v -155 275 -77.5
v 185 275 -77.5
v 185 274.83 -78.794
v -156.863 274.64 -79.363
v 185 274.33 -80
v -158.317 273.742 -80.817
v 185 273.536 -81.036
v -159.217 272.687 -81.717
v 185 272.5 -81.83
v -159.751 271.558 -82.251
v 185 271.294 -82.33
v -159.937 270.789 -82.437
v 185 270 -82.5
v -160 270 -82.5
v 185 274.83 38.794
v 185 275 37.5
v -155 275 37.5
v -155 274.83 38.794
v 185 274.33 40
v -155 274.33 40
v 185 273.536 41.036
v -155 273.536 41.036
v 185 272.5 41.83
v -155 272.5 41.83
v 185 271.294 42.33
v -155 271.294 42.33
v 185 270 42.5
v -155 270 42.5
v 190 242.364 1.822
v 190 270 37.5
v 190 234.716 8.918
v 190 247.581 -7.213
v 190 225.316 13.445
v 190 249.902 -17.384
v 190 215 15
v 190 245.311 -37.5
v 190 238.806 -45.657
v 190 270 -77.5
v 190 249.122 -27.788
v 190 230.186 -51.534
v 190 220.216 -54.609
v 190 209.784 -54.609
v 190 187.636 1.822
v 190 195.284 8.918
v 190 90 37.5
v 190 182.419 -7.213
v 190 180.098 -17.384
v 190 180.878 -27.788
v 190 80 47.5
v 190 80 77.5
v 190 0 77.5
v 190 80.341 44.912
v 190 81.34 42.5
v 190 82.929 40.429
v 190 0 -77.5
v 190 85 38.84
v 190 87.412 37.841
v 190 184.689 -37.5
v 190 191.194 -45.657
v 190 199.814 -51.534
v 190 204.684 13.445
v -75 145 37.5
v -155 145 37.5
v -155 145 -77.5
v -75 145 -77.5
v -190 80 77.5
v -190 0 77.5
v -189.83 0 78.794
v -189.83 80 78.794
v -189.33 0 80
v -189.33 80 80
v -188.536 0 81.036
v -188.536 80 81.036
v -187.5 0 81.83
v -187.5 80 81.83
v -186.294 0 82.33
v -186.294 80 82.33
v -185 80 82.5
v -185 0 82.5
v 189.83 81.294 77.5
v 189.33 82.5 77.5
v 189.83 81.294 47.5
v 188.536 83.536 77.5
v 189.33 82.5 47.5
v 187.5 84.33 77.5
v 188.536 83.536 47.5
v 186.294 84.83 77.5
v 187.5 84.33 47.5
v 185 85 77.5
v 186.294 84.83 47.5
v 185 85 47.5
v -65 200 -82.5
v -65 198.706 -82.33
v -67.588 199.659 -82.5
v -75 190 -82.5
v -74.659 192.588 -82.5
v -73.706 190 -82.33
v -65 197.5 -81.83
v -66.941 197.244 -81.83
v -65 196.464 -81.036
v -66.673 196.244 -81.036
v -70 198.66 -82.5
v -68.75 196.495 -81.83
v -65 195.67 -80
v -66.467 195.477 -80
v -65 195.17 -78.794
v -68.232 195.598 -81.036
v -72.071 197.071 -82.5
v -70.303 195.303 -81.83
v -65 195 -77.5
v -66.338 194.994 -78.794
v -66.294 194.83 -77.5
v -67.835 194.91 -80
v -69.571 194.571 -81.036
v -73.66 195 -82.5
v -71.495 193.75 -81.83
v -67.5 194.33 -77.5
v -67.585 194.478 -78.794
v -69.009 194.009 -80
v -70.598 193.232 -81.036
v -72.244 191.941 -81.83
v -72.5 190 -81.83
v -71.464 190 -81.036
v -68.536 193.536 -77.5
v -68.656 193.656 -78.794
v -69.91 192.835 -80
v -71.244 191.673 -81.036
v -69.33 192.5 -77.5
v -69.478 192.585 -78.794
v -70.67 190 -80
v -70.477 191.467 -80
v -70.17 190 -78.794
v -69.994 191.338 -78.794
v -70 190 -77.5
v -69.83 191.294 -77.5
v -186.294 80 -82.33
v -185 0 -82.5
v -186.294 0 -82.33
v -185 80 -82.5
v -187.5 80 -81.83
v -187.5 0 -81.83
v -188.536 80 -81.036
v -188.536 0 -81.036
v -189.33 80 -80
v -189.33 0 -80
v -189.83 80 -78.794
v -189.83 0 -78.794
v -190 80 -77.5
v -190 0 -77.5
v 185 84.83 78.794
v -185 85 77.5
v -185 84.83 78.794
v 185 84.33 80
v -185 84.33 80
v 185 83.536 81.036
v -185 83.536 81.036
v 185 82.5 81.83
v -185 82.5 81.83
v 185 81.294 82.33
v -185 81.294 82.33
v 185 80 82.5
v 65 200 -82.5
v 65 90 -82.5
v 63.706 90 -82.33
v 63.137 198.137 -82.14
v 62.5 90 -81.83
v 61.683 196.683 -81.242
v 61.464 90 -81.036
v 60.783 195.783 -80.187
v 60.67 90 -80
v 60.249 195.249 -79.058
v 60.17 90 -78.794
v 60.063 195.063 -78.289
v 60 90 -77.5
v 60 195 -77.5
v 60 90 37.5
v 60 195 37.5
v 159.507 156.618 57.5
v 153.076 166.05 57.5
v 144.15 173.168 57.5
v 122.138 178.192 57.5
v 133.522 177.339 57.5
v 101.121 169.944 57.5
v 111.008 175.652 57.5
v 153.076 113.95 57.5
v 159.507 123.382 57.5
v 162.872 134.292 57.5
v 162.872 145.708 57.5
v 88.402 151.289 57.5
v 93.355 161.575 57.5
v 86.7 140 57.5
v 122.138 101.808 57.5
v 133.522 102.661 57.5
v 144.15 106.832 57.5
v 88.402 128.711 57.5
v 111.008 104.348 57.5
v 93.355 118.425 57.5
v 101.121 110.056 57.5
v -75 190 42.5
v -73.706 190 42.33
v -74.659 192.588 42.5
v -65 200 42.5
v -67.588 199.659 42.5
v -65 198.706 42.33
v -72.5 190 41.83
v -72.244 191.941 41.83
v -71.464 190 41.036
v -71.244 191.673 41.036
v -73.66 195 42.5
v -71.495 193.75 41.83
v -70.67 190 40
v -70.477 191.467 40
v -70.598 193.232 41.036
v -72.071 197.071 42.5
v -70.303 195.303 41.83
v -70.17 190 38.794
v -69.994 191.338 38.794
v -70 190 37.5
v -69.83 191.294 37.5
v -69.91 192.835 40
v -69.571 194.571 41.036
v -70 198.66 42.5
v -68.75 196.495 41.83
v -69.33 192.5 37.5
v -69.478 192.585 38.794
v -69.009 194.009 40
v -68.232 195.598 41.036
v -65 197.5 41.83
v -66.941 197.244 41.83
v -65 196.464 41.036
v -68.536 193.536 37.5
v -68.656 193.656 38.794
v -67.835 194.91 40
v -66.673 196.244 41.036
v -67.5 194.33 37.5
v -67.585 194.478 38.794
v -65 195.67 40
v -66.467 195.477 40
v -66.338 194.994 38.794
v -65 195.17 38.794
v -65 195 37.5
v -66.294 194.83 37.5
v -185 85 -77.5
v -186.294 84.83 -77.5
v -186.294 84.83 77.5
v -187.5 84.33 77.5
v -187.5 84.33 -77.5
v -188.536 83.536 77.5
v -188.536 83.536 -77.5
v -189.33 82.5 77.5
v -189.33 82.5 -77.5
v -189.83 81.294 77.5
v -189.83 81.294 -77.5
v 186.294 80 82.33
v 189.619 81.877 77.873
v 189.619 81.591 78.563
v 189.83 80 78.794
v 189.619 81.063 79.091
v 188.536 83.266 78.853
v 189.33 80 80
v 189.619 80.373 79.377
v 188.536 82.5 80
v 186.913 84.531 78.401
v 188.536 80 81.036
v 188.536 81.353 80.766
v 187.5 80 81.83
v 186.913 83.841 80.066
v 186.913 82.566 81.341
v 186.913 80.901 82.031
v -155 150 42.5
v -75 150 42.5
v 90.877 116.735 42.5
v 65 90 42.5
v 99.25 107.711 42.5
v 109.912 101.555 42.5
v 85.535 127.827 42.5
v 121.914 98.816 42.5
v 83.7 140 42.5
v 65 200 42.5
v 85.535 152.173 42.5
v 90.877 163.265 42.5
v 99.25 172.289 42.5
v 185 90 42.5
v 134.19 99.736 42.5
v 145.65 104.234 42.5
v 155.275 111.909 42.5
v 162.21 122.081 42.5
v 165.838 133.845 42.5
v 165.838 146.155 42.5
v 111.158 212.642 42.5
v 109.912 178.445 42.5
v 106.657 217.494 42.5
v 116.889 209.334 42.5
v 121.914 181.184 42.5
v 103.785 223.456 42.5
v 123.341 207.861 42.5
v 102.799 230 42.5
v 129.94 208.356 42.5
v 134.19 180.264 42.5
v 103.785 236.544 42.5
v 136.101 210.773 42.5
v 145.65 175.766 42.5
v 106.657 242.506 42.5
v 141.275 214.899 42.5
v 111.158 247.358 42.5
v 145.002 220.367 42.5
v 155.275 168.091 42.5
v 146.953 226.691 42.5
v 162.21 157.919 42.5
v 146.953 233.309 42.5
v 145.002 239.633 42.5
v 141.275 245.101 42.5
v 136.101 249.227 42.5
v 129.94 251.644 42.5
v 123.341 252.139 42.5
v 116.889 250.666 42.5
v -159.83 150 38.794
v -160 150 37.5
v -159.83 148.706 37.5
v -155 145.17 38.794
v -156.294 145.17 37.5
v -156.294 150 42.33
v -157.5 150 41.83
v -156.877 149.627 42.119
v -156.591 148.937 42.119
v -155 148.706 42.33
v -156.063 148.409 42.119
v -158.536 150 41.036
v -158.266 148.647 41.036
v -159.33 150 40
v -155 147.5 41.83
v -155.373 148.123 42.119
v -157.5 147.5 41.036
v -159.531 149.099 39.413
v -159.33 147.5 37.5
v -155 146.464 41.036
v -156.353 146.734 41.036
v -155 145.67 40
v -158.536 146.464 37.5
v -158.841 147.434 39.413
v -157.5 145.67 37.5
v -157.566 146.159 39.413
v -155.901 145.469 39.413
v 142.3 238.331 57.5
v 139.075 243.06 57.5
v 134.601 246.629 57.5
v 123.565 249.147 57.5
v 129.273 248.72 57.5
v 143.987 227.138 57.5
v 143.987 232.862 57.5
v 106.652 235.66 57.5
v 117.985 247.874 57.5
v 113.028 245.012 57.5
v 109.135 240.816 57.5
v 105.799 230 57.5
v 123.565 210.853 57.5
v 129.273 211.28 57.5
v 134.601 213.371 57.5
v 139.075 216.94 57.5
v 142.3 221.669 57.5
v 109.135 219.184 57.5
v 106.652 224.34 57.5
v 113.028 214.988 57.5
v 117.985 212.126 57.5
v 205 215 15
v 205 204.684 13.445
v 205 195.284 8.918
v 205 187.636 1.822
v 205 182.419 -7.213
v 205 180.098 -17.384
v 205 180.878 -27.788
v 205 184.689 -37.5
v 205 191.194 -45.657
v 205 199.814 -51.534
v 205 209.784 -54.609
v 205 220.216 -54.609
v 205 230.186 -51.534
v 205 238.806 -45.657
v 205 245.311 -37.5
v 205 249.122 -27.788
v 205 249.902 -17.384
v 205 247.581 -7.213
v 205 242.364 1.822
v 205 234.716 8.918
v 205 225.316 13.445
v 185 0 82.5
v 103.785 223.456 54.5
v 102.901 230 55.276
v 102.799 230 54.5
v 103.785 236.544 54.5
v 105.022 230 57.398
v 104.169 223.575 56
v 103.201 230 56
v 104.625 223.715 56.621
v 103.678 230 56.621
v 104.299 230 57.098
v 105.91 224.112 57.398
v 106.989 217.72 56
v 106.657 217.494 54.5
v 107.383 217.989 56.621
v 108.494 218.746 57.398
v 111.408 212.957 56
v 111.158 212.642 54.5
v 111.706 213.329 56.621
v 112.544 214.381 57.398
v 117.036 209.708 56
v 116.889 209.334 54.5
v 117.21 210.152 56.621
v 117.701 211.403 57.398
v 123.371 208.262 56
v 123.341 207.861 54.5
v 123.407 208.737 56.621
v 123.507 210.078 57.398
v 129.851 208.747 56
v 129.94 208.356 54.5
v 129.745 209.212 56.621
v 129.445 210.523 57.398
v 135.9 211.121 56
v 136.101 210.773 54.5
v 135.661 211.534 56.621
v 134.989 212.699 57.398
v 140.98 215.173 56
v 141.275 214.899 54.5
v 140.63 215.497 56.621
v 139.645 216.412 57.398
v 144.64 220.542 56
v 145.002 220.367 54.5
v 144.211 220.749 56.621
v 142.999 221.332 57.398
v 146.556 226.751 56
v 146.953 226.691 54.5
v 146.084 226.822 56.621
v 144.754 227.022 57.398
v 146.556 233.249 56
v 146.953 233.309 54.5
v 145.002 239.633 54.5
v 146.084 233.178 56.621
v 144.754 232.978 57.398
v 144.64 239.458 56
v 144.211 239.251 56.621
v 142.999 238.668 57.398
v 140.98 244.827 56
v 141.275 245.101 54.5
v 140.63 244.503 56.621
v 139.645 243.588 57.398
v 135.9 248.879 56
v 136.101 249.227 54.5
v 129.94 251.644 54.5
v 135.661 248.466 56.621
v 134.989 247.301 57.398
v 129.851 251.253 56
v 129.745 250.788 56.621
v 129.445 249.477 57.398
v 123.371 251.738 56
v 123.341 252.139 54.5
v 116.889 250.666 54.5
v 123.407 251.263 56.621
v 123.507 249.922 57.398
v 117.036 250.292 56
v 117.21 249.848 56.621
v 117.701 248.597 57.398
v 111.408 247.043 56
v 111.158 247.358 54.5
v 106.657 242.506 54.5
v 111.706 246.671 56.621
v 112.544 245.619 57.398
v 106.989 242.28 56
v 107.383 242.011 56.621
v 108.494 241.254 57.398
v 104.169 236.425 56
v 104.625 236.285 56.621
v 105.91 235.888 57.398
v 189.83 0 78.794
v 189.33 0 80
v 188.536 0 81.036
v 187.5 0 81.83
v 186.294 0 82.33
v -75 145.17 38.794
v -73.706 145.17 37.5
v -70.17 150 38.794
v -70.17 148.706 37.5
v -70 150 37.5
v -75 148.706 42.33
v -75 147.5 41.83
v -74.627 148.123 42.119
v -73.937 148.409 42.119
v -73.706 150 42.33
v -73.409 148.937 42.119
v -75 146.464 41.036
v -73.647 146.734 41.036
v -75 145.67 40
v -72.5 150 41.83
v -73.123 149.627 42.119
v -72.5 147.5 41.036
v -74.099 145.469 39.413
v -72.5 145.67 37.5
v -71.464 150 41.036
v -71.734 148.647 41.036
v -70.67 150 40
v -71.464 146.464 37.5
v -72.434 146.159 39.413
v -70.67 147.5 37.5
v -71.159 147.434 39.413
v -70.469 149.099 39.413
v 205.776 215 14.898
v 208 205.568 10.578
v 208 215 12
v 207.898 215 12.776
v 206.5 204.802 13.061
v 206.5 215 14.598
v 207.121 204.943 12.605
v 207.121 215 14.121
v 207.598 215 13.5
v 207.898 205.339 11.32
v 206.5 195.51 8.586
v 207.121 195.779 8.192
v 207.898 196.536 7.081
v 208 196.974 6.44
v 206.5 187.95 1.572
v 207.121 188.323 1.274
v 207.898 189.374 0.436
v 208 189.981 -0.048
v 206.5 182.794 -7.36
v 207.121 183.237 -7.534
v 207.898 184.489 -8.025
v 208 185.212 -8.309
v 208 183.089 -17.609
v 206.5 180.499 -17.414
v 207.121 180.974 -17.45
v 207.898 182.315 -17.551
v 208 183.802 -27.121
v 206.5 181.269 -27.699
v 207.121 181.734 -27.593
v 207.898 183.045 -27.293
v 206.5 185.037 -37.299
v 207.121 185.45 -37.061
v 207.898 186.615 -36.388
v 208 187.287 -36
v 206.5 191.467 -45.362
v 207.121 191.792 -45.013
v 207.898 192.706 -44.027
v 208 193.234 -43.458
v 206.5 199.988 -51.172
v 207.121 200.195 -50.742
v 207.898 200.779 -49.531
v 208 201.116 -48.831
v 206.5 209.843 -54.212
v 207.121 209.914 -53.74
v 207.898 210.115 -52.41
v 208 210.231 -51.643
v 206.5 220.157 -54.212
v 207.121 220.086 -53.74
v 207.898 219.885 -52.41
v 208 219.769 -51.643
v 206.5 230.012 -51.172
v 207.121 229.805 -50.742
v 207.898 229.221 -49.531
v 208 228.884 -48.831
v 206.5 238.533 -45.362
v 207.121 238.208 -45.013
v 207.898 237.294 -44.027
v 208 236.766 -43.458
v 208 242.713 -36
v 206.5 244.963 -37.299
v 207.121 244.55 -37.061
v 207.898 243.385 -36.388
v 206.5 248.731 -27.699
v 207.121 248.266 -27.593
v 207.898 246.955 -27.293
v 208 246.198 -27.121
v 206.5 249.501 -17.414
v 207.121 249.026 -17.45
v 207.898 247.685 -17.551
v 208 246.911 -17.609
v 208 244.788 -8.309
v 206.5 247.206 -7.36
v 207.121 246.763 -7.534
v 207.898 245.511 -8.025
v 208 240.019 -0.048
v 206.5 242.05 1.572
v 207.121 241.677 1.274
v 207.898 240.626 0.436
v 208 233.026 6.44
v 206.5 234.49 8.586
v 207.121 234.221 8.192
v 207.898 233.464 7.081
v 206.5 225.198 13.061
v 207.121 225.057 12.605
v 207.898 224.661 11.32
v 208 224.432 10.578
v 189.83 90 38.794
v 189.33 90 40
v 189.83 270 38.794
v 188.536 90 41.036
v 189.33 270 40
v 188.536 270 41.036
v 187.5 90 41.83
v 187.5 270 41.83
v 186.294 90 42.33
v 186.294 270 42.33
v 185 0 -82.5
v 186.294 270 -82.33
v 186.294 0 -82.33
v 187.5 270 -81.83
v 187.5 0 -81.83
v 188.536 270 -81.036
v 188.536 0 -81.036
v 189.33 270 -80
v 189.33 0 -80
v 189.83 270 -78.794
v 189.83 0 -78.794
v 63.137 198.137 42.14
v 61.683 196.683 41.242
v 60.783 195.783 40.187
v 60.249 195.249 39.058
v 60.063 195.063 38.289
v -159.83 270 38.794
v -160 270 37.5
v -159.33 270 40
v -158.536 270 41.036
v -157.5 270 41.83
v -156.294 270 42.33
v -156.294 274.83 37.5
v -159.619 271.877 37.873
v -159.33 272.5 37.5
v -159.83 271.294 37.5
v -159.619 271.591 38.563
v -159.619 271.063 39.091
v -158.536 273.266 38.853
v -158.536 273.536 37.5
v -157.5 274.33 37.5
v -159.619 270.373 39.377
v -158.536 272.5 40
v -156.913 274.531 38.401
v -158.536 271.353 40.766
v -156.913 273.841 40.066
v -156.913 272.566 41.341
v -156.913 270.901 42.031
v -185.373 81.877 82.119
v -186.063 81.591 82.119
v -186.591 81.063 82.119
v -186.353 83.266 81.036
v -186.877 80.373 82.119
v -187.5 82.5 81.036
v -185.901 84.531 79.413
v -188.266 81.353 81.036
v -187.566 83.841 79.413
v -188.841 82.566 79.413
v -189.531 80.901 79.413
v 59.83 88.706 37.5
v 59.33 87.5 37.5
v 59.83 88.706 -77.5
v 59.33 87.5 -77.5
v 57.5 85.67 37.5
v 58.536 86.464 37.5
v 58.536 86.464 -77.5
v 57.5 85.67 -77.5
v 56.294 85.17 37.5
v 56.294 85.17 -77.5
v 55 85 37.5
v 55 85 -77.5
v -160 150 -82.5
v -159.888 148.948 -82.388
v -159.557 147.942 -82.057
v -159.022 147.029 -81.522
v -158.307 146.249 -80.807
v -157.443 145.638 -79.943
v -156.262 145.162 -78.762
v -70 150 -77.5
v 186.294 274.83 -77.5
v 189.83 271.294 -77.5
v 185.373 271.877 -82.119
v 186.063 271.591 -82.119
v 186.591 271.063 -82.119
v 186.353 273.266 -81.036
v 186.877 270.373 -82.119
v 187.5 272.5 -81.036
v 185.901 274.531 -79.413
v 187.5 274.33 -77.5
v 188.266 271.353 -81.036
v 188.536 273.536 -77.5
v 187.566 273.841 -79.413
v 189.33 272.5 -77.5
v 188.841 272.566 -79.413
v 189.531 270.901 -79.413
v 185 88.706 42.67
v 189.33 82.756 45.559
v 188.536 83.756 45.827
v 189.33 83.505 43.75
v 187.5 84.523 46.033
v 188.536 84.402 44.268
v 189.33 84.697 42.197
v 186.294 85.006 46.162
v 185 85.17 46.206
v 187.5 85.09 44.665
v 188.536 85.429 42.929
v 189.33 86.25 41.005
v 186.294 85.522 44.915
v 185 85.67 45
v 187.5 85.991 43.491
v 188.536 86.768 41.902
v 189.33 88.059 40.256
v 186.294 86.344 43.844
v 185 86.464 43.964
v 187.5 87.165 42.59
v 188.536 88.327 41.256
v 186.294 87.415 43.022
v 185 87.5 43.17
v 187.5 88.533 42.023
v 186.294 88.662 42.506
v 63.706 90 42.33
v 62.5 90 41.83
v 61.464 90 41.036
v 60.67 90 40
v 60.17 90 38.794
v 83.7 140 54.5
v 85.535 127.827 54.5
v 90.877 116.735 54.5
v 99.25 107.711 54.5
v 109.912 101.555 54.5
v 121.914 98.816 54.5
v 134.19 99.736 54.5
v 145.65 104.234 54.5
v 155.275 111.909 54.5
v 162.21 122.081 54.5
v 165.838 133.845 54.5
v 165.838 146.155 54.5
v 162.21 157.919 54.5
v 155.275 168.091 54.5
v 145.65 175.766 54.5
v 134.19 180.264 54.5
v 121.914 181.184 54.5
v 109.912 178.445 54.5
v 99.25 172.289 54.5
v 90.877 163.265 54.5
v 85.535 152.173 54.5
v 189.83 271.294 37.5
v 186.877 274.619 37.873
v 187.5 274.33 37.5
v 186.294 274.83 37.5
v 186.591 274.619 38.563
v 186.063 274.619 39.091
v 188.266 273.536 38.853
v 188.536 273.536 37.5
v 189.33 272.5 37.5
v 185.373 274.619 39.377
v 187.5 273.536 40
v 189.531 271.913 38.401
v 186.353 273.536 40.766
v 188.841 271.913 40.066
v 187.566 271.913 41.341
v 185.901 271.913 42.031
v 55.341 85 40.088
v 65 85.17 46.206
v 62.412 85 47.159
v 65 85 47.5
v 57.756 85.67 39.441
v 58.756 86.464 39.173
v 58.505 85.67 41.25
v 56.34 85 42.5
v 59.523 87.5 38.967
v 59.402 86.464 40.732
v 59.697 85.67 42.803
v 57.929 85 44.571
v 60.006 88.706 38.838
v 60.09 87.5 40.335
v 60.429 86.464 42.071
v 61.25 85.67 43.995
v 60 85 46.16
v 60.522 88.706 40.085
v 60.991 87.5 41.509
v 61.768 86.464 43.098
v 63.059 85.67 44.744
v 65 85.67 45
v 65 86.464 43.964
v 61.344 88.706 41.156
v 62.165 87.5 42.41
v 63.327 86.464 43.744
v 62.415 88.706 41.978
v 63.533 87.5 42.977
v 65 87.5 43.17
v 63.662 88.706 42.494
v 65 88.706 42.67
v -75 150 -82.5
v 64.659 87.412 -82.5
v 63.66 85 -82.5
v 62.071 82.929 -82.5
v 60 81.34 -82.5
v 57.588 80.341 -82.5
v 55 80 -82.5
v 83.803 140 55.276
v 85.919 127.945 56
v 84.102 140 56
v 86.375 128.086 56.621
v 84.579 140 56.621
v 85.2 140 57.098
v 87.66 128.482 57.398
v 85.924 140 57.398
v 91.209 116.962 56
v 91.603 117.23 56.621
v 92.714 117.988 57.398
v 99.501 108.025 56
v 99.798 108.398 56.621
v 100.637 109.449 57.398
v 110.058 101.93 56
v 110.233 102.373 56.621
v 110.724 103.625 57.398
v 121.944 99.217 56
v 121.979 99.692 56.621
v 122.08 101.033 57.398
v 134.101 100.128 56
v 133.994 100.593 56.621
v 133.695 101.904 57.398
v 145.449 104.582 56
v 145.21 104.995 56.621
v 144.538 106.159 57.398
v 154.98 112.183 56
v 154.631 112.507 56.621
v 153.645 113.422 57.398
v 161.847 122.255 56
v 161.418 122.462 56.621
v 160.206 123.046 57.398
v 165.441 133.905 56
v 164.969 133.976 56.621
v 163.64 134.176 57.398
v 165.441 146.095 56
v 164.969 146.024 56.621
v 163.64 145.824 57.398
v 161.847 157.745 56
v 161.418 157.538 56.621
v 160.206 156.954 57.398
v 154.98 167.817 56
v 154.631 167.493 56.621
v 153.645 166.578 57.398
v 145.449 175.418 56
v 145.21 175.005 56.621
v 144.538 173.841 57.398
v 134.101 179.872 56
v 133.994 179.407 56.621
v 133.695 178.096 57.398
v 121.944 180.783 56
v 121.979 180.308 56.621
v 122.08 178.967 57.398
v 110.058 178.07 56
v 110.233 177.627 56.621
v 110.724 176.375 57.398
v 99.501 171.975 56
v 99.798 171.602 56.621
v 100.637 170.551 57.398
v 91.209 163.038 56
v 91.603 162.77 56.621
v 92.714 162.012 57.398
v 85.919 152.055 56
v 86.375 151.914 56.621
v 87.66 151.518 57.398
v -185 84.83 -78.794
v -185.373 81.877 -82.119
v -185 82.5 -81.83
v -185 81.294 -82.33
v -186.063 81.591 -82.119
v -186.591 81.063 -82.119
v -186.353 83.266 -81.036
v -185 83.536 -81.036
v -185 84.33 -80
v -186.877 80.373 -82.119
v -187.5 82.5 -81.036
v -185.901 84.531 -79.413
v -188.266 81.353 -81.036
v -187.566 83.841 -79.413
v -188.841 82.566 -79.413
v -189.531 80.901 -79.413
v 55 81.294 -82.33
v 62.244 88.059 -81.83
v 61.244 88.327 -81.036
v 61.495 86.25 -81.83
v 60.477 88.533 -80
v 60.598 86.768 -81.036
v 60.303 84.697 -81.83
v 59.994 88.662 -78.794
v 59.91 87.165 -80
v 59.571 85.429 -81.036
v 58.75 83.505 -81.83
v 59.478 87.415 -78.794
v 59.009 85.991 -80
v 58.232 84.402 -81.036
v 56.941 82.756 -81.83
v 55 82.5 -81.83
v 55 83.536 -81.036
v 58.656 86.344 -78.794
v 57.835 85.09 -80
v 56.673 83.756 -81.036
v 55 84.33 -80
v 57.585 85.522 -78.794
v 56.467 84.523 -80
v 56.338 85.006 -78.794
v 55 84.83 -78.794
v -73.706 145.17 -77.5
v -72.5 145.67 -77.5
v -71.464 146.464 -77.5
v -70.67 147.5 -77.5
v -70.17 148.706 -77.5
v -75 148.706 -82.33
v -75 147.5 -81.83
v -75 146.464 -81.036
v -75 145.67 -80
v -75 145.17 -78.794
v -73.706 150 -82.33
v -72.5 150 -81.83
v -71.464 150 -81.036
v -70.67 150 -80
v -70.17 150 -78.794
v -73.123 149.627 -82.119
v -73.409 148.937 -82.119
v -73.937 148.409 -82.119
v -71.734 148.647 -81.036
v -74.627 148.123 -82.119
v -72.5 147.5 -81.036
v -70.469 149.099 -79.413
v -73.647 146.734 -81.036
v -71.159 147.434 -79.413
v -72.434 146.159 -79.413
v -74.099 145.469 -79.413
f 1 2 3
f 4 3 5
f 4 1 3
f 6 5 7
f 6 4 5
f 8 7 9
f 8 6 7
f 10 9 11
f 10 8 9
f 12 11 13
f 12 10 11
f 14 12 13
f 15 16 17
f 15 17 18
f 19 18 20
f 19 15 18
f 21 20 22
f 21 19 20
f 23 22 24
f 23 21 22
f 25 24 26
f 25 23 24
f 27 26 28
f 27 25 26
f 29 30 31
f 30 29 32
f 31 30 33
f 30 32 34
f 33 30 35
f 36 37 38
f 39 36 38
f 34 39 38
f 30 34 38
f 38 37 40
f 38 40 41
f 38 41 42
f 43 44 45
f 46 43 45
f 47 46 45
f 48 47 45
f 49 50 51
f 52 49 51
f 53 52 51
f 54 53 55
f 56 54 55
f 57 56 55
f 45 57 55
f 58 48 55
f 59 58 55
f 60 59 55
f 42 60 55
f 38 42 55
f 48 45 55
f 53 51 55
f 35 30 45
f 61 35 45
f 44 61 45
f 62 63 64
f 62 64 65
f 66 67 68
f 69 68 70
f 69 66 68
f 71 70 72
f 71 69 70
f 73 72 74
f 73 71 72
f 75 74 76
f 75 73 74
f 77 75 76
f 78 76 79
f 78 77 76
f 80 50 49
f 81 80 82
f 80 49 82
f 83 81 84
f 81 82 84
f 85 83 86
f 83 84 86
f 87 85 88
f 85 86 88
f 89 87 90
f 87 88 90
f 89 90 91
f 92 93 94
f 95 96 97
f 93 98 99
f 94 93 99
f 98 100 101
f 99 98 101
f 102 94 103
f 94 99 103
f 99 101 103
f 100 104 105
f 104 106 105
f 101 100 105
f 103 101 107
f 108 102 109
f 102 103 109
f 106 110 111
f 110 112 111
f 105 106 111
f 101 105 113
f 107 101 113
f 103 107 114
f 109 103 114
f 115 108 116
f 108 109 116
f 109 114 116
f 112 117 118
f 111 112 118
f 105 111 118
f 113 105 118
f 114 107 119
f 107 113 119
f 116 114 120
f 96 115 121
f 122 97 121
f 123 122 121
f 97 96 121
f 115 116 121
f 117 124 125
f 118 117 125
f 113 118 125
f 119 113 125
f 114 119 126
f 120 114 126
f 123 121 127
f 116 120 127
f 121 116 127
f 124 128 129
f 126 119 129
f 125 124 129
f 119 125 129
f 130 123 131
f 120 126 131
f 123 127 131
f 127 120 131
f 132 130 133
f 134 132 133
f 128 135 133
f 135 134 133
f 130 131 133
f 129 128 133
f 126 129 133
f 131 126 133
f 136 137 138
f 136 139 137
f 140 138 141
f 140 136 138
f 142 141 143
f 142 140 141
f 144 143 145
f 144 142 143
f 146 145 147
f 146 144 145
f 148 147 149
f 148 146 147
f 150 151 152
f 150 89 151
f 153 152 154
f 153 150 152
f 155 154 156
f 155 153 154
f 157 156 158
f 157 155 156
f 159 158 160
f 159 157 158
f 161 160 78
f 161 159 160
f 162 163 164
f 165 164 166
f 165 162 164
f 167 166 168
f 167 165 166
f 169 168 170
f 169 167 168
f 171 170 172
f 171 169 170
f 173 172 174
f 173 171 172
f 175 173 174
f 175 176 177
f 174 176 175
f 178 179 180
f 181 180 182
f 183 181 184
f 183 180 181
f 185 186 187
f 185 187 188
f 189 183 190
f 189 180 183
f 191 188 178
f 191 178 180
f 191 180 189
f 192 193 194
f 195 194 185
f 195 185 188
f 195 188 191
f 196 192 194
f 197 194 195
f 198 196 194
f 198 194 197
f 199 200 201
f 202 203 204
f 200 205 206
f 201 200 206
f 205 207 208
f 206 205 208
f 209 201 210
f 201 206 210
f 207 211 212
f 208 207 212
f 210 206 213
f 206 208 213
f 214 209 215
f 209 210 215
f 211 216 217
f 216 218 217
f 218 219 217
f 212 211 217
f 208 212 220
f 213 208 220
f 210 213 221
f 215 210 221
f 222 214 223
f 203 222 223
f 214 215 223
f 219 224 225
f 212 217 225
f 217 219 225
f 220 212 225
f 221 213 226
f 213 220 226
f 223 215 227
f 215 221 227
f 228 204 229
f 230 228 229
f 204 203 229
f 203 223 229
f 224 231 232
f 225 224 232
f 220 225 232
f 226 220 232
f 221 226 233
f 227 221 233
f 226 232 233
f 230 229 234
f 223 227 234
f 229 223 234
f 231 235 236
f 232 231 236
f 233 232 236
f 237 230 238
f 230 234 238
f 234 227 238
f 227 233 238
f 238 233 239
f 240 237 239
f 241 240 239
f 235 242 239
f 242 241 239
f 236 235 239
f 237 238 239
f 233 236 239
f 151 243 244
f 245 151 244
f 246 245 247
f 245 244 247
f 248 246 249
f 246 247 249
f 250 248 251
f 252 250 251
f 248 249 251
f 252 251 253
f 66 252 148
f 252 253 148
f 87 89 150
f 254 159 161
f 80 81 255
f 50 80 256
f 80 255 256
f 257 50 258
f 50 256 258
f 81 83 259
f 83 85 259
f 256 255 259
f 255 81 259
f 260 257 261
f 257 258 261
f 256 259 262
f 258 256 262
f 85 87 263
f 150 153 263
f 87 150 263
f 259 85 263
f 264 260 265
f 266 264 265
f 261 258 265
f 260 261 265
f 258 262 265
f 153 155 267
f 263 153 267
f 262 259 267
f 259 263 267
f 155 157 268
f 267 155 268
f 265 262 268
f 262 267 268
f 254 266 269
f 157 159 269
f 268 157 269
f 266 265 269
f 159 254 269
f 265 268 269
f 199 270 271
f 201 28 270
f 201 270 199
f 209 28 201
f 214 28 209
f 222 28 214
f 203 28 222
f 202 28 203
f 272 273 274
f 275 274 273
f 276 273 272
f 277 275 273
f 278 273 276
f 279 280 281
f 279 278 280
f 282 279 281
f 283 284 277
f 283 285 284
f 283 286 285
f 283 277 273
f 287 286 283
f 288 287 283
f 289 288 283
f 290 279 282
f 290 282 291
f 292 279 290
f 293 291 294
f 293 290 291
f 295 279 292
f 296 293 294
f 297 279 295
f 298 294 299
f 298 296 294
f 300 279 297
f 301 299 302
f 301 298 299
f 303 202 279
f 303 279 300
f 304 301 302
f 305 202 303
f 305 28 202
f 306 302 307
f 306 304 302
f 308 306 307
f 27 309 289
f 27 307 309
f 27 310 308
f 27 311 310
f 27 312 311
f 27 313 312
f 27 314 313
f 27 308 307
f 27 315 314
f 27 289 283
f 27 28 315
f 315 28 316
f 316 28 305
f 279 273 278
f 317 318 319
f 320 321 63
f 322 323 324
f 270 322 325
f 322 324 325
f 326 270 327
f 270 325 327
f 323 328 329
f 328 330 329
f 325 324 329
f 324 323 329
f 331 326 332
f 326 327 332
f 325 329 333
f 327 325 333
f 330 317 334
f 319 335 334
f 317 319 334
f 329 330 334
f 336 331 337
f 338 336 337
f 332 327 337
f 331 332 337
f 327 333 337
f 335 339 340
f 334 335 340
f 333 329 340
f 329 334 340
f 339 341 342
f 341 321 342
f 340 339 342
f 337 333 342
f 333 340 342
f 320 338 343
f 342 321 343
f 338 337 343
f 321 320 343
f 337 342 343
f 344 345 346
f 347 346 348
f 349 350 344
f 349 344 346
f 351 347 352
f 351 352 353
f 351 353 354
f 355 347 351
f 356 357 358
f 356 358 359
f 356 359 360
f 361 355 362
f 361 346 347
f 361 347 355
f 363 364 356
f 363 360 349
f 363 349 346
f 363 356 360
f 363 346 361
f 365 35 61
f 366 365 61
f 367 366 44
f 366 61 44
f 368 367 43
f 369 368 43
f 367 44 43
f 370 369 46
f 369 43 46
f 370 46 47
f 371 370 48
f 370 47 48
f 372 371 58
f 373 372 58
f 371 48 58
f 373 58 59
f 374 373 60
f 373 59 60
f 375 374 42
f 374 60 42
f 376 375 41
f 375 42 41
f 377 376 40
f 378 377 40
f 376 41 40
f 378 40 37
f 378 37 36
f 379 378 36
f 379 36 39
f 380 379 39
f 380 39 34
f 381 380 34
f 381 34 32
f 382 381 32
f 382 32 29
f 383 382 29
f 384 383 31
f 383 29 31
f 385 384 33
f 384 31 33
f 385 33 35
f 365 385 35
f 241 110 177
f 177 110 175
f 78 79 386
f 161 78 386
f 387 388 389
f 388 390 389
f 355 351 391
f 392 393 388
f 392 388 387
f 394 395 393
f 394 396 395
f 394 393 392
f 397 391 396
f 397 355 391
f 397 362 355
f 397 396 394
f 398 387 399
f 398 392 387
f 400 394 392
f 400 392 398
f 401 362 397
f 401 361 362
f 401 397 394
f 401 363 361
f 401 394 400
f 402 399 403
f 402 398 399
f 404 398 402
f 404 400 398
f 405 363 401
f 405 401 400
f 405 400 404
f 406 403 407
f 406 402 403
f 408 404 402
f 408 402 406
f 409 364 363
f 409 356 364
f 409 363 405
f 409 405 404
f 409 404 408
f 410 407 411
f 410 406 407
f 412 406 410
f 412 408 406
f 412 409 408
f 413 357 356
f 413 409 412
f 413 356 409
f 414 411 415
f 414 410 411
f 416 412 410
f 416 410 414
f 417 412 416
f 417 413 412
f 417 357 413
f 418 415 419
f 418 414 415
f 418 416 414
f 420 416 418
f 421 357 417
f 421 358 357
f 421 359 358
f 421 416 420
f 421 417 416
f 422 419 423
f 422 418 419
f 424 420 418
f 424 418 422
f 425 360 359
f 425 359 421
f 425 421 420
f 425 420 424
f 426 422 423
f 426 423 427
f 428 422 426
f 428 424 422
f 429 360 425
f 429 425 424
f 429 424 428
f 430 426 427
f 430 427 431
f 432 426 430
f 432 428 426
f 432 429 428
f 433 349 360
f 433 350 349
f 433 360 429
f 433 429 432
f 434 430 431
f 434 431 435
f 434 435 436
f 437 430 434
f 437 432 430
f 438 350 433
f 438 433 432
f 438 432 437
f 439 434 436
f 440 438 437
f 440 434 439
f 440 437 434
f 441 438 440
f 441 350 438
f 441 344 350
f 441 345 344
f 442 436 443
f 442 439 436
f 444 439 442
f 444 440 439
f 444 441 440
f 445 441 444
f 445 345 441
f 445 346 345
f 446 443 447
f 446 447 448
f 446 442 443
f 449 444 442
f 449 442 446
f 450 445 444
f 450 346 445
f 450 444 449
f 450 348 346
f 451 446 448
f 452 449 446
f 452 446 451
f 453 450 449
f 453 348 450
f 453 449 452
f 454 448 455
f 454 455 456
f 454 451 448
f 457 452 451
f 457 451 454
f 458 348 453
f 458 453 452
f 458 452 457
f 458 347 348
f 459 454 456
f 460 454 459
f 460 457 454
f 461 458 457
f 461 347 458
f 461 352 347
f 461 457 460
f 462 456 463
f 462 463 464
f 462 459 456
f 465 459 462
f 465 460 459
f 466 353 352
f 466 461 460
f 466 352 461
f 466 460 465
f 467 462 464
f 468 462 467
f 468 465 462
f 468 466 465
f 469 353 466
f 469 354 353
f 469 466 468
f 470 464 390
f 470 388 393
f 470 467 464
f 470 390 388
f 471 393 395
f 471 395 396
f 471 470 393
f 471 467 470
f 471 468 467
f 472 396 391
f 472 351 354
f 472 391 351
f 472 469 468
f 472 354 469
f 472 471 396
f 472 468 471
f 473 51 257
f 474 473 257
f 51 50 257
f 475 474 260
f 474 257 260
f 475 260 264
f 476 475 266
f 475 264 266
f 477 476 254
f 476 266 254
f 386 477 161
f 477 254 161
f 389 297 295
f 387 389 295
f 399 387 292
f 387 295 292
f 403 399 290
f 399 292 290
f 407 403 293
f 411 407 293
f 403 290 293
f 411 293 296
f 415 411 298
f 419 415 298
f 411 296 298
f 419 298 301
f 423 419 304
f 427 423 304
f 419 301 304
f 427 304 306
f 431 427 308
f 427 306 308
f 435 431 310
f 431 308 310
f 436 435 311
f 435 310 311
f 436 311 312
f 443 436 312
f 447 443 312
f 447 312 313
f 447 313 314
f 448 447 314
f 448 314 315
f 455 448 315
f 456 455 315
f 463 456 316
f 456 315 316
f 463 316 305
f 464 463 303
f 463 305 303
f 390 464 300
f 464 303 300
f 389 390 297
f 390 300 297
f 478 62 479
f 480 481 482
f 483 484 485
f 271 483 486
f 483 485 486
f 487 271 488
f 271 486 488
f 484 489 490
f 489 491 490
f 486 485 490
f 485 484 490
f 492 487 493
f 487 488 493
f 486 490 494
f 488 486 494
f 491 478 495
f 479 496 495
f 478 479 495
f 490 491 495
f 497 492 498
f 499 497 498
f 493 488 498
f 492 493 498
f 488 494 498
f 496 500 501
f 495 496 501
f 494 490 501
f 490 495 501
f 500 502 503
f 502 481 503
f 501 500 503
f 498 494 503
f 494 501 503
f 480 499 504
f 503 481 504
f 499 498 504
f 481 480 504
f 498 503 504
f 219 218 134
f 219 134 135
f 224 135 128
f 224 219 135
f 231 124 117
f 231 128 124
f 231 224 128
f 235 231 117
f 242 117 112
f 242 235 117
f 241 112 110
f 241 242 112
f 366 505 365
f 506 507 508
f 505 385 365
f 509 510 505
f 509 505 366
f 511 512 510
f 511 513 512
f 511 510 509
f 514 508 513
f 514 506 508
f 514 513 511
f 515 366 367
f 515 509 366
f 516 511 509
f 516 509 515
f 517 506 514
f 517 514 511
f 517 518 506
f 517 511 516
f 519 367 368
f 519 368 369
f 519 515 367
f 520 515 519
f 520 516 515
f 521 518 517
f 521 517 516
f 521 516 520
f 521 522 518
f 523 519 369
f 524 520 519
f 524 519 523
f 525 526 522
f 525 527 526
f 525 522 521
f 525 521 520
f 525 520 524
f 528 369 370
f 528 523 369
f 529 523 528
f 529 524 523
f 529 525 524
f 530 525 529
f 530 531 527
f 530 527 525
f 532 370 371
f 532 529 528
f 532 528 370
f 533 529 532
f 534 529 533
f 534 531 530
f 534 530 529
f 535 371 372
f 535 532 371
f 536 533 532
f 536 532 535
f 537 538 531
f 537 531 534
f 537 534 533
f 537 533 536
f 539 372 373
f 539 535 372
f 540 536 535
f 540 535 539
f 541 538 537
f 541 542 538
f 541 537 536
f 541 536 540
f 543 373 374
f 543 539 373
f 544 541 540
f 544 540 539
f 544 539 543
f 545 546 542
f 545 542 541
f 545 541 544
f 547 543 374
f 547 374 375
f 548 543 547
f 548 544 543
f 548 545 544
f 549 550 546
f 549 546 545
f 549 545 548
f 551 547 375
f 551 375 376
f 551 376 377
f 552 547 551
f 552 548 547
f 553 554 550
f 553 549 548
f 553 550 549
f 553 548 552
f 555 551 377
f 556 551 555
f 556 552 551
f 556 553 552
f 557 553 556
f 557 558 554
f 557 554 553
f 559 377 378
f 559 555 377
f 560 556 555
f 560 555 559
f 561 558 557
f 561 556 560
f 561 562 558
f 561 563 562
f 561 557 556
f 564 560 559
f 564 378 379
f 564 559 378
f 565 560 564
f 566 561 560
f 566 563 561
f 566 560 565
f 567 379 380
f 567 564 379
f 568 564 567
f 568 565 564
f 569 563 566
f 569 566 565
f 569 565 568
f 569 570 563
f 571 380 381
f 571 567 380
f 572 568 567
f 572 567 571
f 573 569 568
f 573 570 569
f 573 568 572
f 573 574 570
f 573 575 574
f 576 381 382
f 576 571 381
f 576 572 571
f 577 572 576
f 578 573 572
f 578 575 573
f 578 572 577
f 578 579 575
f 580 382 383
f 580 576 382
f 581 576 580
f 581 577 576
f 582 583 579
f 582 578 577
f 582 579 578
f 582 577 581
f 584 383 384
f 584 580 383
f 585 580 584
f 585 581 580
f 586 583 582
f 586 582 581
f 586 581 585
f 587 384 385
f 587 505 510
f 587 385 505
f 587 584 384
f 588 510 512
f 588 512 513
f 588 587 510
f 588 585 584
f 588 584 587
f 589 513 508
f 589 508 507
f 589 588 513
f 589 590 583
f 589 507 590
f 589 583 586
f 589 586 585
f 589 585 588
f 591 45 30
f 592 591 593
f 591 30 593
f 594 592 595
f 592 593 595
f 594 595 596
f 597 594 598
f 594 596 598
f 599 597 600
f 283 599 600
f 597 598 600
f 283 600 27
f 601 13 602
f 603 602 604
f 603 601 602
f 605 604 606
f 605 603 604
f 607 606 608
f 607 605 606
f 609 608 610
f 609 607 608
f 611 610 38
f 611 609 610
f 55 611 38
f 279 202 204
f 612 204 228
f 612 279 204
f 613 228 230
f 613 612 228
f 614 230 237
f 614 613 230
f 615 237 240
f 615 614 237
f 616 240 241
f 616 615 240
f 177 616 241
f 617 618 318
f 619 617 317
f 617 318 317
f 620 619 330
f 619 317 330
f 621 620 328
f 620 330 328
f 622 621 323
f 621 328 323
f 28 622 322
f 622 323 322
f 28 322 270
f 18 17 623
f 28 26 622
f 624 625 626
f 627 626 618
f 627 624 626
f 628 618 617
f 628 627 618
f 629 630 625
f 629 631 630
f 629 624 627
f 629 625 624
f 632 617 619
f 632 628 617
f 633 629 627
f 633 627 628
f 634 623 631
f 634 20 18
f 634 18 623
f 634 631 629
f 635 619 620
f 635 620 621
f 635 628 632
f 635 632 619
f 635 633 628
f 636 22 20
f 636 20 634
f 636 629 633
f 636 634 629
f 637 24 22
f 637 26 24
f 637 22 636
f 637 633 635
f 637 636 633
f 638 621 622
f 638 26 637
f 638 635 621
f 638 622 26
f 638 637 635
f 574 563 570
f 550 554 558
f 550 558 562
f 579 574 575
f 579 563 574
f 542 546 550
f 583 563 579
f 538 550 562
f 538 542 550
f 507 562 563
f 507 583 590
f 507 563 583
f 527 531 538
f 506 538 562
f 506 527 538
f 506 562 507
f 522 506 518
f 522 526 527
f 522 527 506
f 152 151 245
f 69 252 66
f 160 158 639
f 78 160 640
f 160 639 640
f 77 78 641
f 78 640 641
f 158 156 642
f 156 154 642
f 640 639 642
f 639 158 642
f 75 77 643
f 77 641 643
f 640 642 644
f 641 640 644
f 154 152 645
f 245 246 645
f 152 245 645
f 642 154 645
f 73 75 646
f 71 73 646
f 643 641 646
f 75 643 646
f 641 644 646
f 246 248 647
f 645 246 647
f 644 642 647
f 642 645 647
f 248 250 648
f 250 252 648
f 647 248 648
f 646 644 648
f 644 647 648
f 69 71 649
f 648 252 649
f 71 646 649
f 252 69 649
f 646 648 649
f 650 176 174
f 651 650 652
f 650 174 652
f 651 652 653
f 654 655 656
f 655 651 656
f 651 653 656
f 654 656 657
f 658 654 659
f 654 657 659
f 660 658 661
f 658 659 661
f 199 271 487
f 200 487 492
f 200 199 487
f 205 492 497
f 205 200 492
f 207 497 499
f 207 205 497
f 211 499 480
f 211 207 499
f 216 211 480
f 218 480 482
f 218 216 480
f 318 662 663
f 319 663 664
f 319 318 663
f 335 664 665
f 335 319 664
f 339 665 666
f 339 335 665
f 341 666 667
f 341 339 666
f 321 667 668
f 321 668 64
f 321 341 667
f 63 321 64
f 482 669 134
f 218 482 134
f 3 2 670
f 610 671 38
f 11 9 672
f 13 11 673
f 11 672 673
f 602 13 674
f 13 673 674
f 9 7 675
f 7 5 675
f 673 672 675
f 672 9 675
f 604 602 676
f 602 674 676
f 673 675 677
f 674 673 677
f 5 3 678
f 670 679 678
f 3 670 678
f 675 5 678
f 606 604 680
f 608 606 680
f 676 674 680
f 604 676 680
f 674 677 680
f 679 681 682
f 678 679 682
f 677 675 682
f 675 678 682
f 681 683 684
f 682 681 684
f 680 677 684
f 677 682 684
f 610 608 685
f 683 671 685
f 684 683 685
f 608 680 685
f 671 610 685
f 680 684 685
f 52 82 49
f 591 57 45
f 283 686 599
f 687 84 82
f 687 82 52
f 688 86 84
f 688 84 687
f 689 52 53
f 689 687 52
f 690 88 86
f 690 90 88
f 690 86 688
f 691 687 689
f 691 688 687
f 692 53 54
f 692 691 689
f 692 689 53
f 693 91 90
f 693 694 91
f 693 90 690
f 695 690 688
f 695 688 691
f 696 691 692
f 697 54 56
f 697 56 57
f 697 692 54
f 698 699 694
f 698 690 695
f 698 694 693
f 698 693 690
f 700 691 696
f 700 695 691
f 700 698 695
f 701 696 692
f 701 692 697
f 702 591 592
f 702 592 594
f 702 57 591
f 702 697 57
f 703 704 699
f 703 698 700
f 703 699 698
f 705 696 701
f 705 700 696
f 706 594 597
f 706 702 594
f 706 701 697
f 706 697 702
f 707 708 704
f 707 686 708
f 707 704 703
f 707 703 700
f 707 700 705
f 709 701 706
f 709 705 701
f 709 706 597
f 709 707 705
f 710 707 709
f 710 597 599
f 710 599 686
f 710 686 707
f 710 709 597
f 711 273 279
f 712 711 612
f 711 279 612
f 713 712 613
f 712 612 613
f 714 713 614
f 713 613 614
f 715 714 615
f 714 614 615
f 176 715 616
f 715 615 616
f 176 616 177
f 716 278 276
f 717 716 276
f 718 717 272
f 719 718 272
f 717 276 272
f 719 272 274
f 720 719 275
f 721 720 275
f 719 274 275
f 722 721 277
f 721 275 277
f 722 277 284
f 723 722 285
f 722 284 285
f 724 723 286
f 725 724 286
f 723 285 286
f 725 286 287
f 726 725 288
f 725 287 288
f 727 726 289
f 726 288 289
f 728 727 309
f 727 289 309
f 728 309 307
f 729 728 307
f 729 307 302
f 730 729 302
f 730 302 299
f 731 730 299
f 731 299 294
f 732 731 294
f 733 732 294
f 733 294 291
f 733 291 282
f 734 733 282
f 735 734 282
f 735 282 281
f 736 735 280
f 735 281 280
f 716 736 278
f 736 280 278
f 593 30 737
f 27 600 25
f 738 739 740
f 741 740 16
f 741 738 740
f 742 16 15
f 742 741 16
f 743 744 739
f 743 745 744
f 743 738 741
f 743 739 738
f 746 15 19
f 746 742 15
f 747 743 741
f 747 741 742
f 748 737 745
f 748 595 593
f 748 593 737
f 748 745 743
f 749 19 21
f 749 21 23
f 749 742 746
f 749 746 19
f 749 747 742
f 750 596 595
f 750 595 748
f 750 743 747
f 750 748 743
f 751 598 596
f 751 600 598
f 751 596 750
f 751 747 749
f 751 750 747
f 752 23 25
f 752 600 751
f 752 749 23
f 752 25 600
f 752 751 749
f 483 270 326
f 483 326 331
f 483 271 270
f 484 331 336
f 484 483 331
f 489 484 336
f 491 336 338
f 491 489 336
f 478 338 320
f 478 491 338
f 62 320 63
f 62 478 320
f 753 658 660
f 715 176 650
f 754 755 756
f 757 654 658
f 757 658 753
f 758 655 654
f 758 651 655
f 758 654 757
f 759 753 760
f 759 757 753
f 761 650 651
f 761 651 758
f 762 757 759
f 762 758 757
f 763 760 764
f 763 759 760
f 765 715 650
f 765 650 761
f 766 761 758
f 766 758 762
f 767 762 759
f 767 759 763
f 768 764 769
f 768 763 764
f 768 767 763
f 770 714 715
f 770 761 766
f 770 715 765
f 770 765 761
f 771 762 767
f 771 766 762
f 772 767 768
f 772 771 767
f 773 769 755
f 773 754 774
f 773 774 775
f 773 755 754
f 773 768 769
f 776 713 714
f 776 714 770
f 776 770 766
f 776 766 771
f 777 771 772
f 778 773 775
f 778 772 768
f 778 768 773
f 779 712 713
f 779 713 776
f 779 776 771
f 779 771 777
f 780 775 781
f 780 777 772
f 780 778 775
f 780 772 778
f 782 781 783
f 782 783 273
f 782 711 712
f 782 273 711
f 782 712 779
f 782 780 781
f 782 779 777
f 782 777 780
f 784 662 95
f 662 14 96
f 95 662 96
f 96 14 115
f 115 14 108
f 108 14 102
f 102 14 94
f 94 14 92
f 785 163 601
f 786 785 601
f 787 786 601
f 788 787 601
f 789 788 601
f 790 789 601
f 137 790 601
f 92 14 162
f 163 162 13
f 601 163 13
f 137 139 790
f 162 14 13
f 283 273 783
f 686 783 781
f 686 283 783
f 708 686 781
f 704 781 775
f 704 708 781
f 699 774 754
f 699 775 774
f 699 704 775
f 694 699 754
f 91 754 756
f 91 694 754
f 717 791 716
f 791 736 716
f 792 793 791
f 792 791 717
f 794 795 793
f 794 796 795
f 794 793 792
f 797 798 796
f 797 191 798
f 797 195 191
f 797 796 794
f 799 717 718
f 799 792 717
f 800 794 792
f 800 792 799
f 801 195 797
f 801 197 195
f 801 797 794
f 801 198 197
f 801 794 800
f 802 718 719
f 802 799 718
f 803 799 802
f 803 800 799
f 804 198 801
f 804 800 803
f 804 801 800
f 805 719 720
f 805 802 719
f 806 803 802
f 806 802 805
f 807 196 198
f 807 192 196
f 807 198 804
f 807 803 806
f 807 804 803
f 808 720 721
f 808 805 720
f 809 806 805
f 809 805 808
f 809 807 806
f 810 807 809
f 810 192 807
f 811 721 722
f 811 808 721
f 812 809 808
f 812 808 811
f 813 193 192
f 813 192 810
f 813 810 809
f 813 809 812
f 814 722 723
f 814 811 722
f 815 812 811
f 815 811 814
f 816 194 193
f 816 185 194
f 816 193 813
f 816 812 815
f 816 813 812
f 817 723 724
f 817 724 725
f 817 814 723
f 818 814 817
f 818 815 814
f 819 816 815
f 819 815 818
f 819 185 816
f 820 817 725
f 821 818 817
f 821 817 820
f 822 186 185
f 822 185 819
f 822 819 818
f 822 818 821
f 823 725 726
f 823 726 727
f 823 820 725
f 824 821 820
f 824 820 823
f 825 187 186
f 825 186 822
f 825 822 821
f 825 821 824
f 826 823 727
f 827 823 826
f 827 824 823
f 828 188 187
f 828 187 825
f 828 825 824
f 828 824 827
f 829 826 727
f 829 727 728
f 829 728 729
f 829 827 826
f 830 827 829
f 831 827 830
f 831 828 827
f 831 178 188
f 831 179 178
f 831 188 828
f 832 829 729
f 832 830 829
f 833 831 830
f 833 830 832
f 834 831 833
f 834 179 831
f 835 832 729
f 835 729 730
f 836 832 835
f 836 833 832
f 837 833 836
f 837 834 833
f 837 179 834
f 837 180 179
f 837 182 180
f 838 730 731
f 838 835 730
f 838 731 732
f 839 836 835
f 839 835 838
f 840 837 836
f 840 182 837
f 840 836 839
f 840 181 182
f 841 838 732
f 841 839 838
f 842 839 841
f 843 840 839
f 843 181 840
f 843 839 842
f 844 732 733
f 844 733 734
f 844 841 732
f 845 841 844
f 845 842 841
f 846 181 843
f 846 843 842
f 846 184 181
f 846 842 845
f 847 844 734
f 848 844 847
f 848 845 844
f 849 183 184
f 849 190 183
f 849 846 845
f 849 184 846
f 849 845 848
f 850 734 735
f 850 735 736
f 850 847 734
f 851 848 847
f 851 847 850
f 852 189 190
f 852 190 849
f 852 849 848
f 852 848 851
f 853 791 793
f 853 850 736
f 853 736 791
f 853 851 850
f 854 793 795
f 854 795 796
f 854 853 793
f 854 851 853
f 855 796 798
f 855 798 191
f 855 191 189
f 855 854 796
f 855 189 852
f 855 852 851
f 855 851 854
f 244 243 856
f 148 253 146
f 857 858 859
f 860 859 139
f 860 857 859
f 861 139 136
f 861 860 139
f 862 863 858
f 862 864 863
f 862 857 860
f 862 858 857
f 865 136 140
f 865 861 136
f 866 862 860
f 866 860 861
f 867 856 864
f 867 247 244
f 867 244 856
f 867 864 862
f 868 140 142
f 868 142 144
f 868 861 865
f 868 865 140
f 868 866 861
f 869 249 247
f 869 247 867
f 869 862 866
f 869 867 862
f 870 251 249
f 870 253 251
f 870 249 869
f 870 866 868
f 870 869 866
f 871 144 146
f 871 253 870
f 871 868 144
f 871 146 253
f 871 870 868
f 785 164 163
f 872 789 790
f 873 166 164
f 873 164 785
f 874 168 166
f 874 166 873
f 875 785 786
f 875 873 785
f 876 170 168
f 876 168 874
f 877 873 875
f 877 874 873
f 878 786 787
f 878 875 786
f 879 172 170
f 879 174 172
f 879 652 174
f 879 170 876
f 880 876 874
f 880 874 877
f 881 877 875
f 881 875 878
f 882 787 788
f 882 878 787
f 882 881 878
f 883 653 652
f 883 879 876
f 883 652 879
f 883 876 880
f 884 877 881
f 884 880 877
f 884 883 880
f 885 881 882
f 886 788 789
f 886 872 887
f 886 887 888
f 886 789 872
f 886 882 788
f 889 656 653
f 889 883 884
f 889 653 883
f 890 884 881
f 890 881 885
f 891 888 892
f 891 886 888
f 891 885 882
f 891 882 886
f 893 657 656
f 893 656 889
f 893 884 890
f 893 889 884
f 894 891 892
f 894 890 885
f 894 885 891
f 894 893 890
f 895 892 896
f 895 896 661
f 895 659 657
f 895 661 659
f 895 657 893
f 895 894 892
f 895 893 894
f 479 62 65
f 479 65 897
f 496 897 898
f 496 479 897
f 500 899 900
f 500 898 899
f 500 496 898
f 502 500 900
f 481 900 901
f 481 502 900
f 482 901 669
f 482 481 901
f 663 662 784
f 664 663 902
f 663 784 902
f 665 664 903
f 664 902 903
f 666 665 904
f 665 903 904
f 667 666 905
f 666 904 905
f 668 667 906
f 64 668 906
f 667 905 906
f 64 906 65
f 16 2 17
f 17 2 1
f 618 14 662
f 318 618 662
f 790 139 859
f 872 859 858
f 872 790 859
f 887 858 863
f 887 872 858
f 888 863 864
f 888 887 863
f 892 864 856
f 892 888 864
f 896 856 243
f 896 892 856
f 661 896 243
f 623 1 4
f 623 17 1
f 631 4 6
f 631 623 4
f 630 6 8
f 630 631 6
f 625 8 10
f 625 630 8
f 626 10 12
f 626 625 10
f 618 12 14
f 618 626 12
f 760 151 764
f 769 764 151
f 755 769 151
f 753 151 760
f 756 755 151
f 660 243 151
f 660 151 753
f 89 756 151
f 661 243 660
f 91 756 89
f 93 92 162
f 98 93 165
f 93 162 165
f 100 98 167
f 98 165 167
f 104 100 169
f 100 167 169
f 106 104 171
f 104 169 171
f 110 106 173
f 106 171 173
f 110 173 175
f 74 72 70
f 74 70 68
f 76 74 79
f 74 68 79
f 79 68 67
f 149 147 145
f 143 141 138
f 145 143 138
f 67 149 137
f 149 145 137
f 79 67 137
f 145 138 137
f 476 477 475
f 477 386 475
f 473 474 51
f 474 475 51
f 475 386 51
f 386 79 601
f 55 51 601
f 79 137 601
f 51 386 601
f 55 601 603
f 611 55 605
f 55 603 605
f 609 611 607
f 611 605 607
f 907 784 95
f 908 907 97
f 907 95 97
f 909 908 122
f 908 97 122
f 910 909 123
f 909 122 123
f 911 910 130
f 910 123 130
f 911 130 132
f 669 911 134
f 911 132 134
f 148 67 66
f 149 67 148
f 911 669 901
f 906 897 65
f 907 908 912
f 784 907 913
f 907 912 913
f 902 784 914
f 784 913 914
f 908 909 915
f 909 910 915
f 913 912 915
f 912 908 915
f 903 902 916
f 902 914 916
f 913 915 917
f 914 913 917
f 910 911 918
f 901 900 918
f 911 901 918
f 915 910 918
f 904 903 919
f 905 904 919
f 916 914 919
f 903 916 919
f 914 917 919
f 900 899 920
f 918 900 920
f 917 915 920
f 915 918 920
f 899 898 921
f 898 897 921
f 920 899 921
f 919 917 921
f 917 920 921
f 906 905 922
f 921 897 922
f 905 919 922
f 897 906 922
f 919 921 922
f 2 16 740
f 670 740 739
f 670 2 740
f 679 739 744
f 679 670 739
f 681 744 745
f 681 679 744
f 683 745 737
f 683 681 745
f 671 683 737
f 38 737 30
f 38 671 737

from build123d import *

# Parameters (mm, degrees)
SKETCH1_W           = 380
SKETCH1_H           = 165
BOSS_EXTRUDE1_DEPTH = 85
SKETCH2_W           = 130
SKETCH2_H           = 125
BOSS_EXTRUDE2_DEPTH = 190
BOSS_EXTRUDE3_DEPTH = 125
SKETCH5_R           = 35
BOSS_EXTRUDE4_DEPTH = 18
FILLET1_R           = 5
SKETCH6_R           = 22.201098979
SKETCH6_R_2         = 41.299501956
BOSS_EXTRUDE5_DEPTH = 15
FILLET2_R           = 3


with BuildPart() as part:
    # Sketch1 → Boss-Extrude1 (new body)
    with BuildSketch(Plane(origin=(0, 0, 0), x_dir=(1, 0, 0), z_dir=(0, 1, 0))):
        Rectangle(SKETCH1_W, SKETCH1_H)
    extrude(amount=BOSS_EXTRUDE1_DEPTH)

    # Sketch2 → Boss-Extrude2 (add)
    with BuildSketch(Plane(origin=(0, 85, 0), x_dir=(1, 0, 0), z_dir=(0, 1, 0))):
        with Locations((125, 20)):
            Rectangle(SKETCH2_W, SKETCH2_H)
    extrude(amount=BOSS_EXTRUDE2_DEPTH)

    # Sketch3 → Boss-Extrude3 (add)
    with BuildSketch(Plane(origin=(0, 0, -82.5), x_dir=(-1, 0, 0), z_dir=(0, 0, -1))):
        Polygon((-60, 275), (160, 275), (160, 145), (70, 145), (70, 195), (-60, 195), align=None)
    extrude(amount=-BOSS_EXTRUDE3_DEPTH)

    # Sketch5 → Boss-Extrude4 (add)
    with BuildSketch(Plane(origin=(190, 0, 0), x_dir=(0, 0, -1), z_dir=(1, 0, 0))):
        with Locations(Location((20, 215, 0), (0, 0, 180))):
            Circle(SKETCH5_R)
    extrude(amount=BOSS_EXTRUDE4_DEPTH)

    # Fillet1
    fillet1_edges = [part.edges().sort_by_distance(p)[0] for p in [
        (-190, 85, 0),
        (-65, 85, -82.5),
        (190, 180, 42.5),
        (60, 85, -20),
        (0, 85, 82.5),
        (125, 85, 42.5),
        (190, 275, -20),
        (15, 275, -82.5),
        (15, 275, 42.5),
        (60, 140, 42.5),
        (60, 140, -82.5),
        (-160, 275, -20),
        (-160, 145, -20),
        (-70, 145, -20),
        (-70, 195, -20),
        (-5, 195, -82.5),
        (-70, 170, -82.5),
        (-115, 145, -82.5),
        (-160, 210, 42.5),
        (-115, 145, 42.5),
        (-70, 170, 42.5),
        (-5, 195, 42.5),
        (190, 85, 62.5),
        (190, 42.5, 82.5),
        (-190, 42.5, 82.5),
        (-190, 42.5, -82.5),
        (190, 137.5, -82.5),
    ]]
    fillet(fillet1_edges, radius=FILLET1_R)

    # Sketch6 → Boss-Extrude5 (add)
    with BuildSketch(Plane.XY.offset(42.5)):
        with Locations(Location((125, 230, 0), (0, 0, 180))):
            Circle(SKETCH6_R)
        with Locations(Location((125, 140, 0), (0, 0, 180))):
            Circle(SKETCH6_R_2)
    extrude(amount=BOSS_EXTRUDE5_DEPTH)

    # Fillet2
    fillet2_edges = [part.edges().sort_by_distance(p)[0] for p in [
        (147.201098979, 230, 57.5),
        (166.299501956, 140, 57.5),
        (208, 215, -55),
    ]]
    fillet(fillet2_edges, radius=FILLET2_R)


solid = part.part
